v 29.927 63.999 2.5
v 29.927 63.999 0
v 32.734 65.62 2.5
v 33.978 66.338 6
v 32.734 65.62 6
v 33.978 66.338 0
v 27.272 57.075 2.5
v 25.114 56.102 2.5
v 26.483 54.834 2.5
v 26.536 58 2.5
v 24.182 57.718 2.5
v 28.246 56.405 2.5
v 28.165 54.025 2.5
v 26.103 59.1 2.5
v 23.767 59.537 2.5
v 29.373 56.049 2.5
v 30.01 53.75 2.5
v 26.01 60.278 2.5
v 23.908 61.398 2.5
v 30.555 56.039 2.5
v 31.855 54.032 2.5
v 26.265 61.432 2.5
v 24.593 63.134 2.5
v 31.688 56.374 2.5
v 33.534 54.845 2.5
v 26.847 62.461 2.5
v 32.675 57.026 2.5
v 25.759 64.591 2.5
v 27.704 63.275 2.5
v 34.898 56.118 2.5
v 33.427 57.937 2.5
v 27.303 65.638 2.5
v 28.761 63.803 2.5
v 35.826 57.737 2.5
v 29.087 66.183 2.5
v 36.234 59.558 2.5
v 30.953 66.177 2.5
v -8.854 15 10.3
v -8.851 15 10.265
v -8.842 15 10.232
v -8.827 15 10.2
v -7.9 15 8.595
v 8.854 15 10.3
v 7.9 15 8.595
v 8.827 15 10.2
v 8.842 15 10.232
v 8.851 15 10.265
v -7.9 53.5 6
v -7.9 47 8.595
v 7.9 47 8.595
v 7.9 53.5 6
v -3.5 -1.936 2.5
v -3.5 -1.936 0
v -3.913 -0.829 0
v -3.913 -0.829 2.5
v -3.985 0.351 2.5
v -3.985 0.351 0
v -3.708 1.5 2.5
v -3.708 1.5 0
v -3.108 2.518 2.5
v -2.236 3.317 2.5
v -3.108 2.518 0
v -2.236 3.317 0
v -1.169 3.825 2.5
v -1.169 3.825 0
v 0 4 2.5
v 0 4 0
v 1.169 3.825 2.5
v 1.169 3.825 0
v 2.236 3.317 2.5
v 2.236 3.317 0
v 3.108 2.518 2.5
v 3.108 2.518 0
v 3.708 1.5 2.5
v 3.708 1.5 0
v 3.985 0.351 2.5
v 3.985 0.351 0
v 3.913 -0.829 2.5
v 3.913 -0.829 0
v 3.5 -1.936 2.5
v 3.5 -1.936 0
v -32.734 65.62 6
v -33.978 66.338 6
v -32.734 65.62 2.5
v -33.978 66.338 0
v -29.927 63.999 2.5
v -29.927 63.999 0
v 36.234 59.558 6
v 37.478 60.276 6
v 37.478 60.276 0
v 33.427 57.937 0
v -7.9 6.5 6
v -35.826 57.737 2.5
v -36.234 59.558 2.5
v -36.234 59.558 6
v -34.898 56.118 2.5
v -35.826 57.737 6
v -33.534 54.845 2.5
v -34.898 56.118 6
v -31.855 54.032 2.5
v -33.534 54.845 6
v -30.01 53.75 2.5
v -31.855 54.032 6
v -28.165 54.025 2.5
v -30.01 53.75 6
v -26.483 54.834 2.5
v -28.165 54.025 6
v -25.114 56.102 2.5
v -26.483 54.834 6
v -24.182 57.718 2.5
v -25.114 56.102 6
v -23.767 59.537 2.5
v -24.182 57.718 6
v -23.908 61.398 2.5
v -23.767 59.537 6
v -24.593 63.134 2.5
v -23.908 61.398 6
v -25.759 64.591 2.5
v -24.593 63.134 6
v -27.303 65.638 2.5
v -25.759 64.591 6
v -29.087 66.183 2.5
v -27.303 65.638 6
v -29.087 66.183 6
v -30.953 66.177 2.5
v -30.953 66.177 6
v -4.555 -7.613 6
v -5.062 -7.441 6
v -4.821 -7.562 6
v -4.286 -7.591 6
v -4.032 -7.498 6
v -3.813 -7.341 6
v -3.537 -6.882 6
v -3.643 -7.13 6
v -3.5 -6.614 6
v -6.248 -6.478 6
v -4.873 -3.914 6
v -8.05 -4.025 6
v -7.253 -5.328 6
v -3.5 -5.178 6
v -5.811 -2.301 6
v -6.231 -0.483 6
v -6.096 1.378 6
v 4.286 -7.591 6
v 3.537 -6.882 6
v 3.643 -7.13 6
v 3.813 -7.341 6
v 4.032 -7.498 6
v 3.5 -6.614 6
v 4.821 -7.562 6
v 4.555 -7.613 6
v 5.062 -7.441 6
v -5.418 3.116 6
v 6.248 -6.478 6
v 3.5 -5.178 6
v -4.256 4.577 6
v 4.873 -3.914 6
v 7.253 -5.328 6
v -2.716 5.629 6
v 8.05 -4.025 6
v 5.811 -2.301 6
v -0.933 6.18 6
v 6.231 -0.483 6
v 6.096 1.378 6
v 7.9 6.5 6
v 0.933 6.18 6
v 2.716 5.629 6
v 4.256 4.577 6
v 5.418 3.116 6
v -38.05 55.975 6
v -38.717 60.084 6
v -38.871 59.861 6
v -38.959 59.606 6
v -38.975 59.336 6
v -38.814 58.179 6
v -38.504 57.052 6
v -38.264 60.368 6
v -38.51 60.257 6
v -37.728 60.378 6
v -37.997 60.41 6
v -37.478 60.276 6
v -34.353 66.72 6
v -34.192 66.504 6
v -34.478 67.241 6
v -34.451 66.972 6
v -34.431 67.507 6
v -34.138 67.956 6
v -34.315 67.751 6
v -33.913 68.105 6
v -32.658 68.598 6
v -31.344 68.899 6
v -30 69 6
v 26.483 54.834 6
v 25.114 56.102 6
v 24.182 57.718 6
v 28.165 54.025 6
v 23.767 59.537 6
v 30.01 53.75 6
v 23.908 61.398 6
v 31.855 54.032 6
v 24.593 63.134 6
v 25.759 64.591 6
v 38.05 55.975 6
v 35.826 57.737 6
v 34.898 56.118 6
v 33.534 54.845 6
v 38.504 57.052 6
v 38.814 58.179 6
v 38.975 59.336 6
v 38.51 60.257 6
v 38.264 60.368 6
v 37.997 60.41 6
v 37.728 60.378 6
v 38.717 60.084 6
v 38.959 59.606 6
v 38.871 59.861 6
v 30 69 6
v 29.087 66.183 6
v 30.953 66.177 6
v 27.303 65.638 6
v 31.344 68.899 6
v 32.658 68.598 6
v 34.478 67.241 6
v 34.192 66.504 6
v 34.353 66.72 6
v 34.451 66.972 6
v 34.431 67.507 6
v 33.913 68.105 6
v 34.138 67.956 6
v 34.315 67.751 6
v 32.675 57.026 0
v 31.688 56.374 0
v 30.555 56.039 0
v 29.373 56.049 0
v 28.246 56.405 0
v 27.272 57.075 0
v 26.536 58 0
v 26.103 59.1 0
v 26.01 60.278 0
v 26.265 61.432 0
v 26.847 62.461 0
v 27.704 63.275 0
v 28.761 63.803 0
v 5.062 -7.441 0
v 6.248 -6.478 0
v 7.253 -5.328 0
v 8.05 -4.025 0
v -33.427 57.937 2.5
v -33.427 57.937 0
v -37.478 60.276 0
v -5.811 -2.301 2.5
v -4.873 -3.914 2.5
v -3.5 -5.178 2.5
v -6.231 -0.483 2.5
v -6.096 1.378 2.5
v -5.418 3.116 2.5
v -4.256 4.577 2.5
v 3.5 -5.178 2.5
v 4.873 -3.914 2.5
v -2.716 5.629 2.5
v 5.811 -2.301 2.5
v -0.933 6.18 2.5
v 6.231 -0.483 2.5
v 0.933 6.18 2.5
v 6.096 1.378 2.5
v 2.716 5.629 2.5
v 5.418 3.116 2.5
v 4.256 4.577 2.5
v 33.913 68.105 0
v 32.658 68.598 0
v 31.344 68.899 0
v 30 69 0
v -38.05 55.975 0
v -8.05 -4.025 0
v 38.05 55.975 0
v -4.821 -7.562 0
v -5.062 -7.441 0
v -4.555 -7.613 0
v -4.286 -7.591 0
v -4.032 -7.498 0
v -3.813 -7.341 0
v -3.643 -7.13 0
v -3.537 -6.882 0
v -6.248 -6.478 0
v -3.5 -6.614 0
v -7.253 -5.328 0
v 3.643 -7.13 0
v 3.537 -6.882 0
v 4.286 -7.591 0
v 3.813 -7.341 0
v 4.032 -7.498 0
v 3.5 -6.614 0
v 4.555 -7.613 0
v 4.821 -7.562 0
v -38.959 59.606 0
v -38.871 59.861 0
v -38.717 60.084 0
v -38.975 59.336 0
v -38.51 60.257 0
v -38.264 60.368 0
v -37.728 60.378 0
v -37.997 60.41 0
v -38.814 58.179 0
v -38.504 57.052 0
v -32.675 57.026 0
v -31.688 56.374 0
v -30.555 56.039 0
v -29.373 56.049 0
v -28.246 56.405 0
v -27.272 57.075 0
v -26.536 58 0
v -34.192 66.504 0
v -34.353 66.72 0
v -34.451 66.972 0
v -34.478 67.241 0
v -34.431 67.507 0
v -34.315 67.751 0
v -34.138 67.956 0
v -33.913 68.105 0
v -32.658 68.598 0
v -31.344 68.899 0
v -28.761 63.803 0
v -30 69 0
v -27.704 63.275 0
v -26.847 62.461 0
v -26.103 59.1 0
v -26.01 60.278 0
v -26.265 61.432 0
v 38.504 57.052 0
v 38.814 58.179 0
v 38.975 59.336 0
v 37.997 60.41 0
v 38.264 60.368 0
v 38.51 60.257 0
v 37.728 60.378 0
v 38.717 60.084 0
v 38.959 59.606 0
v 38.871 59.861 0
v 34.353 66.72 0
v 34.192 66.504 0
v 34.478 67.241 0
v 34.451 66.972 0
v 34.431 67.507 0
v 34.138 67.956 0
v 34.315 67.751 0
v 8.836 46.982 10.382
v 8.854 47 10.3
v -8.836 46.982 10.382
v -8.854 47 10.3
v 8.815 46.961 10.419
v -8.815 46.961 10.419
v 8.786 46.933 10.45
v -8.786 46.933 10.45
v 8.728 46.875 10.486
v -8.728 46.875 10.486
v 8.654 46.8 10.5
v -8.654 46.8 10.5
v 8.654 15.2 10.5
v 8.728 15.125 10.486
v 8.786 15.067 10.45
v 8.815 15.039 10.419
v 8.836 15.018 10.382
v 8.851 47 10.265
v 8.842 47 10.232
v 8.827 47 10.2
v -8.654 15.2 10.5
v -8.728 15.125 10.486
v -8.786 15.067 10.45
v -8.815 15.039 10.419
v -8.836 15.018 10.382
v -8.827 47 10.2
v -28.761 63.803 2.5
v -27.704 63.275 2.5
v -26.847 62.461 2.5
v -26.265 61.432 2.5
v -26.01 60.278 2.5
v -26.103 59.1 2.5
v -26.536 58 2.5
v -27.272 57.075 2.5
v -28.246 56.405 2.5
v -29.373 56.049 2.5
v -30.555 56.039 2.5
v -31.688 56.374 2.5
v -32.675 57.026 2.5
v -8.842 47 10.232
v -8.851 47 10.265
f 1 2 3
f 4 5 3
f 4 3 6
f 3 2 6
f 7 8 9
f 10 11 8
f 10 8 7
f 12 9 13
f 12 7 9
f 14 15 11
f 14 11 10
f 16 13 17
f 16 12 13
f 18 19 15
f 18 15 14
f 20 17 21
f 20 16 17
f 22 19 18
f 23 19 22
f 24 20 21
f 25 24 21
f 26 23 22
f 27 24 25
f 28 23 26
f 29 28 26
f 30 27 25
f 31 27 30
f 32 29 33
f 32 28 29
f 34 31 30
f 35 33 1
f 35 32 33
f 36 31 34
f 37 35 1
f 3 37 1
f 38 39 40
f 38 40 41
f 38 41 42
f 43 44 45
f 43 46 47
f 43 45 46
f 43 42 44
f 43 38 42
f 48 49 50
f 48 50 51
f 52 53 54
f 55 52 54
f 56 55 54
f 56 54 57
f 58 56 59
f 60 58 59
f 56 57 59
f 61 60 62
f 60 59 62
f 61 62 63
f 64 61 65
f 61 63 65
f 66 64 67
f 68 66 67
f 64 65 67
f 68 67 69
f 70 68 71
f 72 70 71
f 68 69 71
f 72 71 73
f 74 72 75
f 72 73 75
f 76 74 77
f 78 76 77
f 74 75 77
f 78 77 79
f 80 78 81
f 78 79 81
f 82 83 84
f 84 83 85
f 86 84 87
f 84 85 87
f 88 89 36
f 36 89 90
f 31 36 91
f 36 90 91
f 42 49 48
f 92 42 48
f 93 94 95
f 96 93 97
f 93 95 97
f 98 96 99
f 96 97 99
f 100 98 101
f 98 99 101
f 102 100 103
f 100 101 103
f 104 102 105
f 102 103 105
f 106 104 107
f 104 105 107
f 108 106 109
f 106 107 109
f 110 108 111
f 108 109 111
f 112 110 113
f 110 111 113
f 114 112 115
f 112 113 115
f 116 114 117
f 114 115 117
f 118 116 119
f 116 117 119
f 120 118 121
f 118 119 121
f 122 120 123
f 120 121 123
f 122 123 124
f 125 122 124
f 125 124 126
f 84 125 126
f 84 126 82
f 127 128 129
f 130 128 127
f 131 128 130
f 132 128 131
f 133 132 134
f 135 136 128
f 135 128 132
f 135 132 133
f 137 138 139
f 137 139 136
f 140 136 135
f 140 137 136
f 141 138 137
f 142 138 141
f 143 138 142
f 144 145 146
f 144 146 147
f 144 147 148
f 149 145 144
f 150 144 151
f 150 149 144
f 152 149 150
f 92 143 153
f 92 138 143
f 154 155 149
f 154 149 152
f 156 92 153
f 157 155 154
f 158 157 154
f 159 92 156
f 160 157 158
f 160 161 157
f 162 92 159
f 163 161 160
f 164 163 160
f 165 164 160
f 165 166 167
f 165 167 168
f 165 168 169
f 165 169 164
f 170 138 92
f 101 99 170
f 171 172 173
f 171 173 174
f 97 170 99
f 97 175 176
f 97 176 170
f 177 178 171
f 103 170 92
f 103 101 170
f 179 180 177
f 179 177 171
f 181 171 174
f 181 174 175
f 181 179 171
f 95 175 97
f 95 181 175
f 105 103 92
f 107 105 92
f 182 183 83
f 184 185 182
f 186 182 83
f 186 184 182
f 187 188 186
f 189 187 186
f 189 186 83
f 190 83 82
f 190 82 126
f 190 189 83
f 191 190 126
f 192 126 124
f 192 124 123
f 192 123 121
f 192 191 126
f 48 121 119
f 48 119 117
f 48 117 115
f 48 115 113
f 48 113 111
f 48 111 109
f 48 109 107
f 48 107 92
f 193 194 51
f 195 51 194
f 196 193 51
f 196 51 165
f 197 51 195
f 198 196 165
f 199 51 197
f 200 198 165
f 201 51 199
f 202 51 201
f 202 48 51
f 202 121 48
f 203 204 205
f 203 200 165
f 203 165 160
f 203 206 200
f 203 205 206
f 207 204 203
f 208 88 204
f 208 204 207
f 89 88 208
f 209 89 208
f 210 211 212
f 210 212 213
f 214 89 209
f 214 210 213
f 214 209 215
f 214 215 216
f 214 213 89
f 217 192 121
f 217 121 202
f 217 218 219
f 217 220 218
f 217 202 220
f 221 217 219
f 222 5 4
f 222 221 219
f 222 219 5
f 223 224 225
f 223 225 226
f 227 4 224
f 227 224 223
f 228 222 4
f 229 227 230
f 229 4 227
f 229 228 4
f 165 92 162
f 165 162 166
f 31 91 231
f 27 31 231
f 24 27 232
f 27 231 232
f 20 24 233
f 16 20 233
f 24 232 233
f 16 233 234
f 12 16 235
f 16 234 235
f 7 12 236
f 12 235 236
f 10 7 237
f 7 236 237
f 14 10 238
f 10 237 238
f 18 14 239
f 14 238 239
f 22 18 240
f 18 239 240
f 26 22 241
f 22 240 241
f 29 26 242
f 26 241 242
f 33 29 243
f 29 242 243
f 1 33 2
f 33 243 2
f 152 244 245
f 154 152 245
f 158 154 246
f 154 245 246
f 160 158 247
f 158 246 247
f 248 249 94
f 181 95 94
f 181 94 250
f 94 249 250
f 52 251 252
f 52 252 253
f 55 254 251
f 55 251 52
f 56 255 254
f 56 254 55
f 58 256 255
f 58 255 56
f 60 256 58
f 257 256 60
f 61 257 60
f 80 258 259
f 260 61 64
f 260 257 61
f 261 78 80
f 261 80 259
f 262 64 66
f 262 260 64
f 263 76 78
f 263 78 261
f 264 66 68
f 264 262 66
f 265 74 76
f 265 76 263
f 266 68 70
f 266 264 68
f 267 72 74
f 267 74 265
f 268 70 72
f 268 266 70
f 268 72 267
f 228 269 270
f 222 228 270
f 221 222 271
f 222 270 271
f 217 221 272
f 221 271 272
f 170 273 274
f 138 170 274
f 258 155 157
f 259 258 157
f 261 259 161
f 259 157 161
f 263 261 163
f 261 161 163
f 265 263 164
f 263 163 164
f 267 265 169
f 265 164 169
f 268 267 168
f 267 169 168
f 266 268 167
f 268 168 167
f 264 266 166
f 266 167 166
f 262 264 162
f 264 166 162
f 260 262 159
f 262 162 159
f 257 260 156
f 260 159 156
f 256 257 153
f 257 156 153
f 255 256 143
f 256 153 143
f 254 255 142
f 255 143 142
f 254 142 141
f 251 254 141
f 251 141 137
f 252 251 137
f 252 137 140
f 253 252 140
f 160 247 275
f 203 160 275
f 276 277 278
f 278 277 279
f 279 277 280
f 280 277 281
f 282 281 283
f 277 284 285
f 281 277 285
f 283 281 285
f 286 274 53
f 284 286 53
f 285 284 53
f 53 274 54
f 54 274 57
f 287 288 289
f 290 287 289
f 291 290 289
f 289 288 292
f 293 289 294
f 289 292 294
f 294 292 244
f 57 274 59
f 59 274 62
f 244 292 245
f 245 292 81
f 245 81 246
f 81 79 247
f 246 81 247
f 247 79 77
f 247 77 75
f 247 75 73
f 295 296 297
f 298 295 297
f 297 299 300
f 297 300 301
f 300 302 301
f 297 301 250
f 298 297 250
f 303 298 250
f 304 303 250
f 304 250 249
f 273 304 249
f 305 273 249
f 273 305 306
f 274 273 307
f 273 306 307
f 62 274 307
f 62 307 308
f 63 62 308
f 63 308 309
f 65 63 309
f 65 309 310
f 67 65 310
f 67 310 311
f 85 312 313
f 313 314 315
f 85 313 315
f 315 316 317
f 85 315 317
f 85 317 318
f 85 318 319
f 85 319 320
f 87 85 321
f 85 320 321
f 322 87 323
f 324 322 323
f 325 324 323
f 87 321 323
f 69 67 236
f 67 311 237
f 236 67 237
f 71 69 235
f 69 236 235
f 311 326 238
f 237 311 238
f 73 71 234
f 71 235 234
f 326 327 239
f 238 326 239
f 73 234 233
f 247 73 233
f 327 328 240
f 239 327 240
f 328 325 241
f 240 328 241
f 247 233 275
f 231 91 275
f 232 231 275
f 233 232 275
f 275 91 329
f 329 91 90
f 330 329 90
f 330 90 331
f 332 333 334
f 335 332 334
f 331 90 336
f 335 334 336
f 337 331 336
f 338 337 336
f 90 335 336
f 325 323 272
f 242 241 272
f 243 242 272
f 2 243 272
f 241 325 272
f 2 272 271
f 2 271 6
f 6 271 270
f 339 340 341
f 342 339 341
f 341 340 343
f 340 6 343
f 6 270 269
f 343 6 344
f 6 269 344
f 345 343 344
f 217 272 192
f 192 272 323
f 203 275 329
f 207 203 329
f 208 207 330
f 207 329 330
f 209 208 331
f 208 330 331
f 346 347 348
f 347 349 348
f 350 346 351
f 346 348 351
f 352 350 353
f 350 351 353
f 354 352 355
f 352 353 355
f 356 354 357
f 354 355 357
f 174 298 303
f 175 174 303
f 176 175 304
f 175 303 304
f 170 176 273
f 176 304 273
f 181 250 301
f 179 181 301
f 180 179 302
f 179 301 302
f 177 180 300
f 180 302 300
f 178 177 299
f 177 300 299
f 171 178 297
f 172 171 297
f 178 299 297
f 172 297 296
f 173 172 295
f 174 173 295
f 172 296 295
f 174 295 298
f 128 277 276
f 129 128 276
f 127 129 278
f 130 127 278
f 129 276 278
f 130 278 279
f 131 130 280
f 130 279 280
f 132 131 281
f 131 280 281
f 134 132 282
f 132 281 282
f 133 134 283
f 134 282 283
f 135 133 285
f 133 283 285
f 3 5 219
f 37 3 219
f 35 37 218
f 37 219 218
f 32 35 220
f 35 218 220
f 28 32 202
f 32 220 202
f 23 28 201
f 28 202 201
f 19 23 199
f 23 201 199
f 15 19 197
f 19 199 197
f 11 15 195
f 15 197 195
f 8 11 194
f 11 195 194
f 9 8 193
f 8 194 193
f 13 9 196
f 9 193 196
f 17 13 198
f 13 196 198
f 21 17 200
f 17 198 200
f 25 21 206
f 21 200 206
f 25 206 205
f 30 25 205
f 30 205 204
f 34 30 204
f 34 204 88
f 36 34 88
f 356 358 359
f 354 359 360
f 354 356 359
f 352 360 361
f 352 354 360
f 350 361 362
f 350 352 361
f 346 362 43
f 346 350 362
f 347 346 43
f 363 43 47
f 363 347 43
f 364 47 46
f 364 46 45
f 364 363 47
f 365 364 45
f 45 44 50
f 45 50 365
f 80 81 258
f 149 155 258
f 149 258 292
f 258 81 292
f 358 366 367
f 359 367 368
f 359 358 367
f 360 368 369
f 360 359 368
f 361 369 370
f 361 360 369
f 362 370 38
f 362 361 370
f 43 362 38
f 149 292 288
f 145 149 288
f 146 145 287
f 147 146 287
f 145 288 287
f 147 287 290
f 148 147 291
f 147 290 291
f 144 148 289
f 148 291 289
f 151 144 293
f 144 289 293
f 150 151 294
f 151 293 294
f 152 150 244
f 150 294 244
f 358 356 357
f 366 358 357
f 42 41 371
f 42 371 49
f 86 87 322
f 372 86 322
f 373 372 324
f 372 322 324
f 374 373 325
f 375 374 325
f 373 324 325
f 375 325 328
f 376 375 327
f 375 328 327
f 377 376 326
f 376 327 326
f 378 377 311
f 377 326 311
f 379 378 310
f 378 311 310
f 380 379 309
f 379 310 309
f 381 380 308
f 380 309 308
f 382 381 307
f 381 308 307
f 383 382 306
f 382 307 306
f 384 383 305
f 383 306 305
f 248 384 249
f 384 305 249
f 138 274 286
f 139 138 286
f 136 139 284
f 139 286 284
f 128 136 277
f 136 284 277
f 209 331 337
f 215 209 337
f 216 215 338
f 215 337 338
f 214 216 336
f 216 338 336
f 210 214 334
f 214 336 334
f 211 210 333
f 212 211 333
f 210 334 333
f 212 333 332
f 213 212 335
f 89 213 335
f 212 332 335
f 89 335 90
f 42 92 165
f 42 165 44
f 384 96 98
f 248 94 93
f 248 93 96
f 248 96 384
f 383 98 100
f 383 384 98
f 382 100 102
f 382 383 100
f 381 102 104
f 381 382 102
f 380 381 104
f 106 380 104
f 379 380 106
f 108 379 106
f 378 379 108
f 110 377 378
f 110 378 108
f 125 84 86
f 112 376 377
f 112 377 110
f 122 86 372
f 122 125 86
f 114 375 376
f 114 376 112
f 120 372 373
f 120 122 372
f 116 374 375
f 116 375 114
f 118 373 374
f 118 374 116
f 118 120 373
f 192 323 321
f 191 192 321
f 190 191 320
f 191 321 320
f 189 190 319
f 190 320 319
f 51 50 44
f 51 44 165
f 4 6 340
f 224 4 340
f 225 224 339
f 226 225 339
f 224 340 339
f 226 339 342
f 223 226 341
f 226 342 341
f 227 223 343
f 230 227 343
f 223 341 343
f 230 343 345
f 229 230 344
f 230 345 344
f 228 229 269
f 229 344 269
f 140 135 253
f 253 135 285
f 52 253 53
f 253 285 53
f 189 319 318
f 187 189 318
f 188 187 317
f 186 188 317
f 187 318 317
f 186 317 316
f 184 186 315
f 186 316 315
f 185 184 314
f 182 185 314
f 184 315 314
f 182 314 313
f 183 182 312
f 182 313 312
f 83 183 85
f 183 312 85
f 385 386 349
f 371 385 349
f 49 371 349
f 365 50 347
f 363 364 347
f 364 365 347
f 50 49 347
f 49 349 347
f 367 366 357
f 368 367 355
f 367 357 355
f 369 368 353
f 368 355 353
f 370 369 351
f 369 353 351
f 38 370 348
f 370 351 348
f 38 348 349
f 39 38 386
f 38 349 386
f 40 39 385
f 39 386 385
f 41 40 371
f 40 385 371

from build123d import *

# Parameters (mm, degrees)
F1_DEPTH = 6
F2_R     = 6.25
F3_DEPTH = 3.5
F4_W     = 15.8
F4_H     = 32
F5_DEPTH = 4.5
F7_DEPTH = 32
F9_DEPTH = 15.8
F10_R    = 0.2


with BuildPart() as f1:
    # F0 (on Top) → F1 (new body)
    with BuildSketch(Plane.XY):
        with BuildLine():
            ThreePointArc((-29.927051, 63.999335), (-26.535898, 58), (-33.427051, 57.937157))
            Line((-33.427051, 57.937157), (-37.47822, 60.2761))
            ThreePointArc((-37.47822, 60.2761), (-38.509832, 60.257063), (-38.975497, 59.336334))
            ThreePointArc((-38.975497, 59.336334), (-38.676985, 57.610456), (-38.049845, 55.975078))
            Line((-38.049845, 55.975078), (-8.049845, -4.024922))
            ThreePointArc((-8.049845, -4.024922), (-6.775035, -5.924433), (-5.0625, -7.441176))
            ThreePointArc((-5.0625, -7.441176), (-4.032293, -7.498262), (-3.5, -6.614378))
            Line((-3.5, -6.614378), (-3.5, -1.936492))
            ThreePointArc((-3.5, -1.936492), (0, 4), (3.5, -1.936492))
            Line((3.5, -1.936492), (3.5, -6.614378))
            ThreePointArc((3.5, -6.614378), (4.032293, -7.498262), (5.0625, -7.441176))
            ThreePointArc((5.0625, -7.441176), (6.775035, -5.924433), (8.049845, -4.024922))
            Line((8.049845, -4.024922), (38.049845, 55.975078))
            ThreePointArc((38.049845, 55.975078), (38.676985, 57.610456), (38.975497, 59.336334))
            ThreePointArc((38.975497, 59.336334), (38.509832, 60.257063), (37.47822, 60.2761))
            Line((37.47822, 60.2761), (33.427051, 57.937157))
            ThreePointArc((33.427051, 57.937157), (26.535898, 58), (29.927051, 63.999335))
            Line((29.927051, 63.999335), (33.97822, 66.338278))
            ThreePointArc((33.97822, 66.338278), (34.477539, 67.241199), (33.912997, 68.104841))
            ThreePointArc((33.912997, 68.104841), (32.007041, 68.773357), (30, 69))
            Line((30, 69), (-30, 69))
            ThreePointArc((-30, 69), (-32.007041, 68.773357), (-33.912997, 68.104841))
            ThreePointArc((-33.912997, 68.104841), (-34.477539, 67.241199), (-33.97822, 66.338278))
            Line((-33.97822, 66.338278), (-29.927051, 63.999335))
        make_face()
    extrude(amount=F1_DEPTH)

    # F2 (on face) → F3 (cut)
    with BuildSketch(Plane.XY.offset(6)):
        with Locations((-30, 60)):
            Circle(F2_R)
        Circle(F2_R)
        with Locations((30, 60)):
            Circle(F2_R)
    extrude(amount=-F3_DEPTH, mode=Mode.SUBTRACT)

    # F4 (on face) → F5 (join)
    with BuildSketch(Plane.XY.offset(6)):
        with Locations((0, 31)):
            Rectangle(F4_W, F4_H)
    extrude(amount=F5_DEPTH)

    # F6 (on face) → F7 (join)
    with BuildSketch(Plane.XZ.offset(-15)):
        Polygon((9, 10.5), (7.9, 10.5), (7.9, 8.594744), align=None)
        Polygon((-7.9, 8.594744), (-7.9, 10.5), (-9, 10.5), align=None)
    extrude(amount=-F7_DEPTH)

    # F8 (on face) → F9 (join)
    with BuildSketch(Plane(origin=(-7.9, 0, 0), x_dir=(0, -1, 0), z_dir=(-1, 0, 0))):
        Polygon((-6.5, 6), (-15, 8.594744), (-15, 6), align=None)
        Polygon((-47, 6), (-47, 8.594744), (-53.5, 6), align=None)
    extrude(amount=-F9_DEPTH)

    # F10
    f10_edges = [f1.edges().sort_by_distance(p)[0] for p in [
        (-9, 31, 10.5),
        (9, 31, 10.5),
        (0, 15, 10.5),
        (0, 47, 10.5),
    ]]
    fillet(f10_edges, radius=F10_R)


solid = f1.part
